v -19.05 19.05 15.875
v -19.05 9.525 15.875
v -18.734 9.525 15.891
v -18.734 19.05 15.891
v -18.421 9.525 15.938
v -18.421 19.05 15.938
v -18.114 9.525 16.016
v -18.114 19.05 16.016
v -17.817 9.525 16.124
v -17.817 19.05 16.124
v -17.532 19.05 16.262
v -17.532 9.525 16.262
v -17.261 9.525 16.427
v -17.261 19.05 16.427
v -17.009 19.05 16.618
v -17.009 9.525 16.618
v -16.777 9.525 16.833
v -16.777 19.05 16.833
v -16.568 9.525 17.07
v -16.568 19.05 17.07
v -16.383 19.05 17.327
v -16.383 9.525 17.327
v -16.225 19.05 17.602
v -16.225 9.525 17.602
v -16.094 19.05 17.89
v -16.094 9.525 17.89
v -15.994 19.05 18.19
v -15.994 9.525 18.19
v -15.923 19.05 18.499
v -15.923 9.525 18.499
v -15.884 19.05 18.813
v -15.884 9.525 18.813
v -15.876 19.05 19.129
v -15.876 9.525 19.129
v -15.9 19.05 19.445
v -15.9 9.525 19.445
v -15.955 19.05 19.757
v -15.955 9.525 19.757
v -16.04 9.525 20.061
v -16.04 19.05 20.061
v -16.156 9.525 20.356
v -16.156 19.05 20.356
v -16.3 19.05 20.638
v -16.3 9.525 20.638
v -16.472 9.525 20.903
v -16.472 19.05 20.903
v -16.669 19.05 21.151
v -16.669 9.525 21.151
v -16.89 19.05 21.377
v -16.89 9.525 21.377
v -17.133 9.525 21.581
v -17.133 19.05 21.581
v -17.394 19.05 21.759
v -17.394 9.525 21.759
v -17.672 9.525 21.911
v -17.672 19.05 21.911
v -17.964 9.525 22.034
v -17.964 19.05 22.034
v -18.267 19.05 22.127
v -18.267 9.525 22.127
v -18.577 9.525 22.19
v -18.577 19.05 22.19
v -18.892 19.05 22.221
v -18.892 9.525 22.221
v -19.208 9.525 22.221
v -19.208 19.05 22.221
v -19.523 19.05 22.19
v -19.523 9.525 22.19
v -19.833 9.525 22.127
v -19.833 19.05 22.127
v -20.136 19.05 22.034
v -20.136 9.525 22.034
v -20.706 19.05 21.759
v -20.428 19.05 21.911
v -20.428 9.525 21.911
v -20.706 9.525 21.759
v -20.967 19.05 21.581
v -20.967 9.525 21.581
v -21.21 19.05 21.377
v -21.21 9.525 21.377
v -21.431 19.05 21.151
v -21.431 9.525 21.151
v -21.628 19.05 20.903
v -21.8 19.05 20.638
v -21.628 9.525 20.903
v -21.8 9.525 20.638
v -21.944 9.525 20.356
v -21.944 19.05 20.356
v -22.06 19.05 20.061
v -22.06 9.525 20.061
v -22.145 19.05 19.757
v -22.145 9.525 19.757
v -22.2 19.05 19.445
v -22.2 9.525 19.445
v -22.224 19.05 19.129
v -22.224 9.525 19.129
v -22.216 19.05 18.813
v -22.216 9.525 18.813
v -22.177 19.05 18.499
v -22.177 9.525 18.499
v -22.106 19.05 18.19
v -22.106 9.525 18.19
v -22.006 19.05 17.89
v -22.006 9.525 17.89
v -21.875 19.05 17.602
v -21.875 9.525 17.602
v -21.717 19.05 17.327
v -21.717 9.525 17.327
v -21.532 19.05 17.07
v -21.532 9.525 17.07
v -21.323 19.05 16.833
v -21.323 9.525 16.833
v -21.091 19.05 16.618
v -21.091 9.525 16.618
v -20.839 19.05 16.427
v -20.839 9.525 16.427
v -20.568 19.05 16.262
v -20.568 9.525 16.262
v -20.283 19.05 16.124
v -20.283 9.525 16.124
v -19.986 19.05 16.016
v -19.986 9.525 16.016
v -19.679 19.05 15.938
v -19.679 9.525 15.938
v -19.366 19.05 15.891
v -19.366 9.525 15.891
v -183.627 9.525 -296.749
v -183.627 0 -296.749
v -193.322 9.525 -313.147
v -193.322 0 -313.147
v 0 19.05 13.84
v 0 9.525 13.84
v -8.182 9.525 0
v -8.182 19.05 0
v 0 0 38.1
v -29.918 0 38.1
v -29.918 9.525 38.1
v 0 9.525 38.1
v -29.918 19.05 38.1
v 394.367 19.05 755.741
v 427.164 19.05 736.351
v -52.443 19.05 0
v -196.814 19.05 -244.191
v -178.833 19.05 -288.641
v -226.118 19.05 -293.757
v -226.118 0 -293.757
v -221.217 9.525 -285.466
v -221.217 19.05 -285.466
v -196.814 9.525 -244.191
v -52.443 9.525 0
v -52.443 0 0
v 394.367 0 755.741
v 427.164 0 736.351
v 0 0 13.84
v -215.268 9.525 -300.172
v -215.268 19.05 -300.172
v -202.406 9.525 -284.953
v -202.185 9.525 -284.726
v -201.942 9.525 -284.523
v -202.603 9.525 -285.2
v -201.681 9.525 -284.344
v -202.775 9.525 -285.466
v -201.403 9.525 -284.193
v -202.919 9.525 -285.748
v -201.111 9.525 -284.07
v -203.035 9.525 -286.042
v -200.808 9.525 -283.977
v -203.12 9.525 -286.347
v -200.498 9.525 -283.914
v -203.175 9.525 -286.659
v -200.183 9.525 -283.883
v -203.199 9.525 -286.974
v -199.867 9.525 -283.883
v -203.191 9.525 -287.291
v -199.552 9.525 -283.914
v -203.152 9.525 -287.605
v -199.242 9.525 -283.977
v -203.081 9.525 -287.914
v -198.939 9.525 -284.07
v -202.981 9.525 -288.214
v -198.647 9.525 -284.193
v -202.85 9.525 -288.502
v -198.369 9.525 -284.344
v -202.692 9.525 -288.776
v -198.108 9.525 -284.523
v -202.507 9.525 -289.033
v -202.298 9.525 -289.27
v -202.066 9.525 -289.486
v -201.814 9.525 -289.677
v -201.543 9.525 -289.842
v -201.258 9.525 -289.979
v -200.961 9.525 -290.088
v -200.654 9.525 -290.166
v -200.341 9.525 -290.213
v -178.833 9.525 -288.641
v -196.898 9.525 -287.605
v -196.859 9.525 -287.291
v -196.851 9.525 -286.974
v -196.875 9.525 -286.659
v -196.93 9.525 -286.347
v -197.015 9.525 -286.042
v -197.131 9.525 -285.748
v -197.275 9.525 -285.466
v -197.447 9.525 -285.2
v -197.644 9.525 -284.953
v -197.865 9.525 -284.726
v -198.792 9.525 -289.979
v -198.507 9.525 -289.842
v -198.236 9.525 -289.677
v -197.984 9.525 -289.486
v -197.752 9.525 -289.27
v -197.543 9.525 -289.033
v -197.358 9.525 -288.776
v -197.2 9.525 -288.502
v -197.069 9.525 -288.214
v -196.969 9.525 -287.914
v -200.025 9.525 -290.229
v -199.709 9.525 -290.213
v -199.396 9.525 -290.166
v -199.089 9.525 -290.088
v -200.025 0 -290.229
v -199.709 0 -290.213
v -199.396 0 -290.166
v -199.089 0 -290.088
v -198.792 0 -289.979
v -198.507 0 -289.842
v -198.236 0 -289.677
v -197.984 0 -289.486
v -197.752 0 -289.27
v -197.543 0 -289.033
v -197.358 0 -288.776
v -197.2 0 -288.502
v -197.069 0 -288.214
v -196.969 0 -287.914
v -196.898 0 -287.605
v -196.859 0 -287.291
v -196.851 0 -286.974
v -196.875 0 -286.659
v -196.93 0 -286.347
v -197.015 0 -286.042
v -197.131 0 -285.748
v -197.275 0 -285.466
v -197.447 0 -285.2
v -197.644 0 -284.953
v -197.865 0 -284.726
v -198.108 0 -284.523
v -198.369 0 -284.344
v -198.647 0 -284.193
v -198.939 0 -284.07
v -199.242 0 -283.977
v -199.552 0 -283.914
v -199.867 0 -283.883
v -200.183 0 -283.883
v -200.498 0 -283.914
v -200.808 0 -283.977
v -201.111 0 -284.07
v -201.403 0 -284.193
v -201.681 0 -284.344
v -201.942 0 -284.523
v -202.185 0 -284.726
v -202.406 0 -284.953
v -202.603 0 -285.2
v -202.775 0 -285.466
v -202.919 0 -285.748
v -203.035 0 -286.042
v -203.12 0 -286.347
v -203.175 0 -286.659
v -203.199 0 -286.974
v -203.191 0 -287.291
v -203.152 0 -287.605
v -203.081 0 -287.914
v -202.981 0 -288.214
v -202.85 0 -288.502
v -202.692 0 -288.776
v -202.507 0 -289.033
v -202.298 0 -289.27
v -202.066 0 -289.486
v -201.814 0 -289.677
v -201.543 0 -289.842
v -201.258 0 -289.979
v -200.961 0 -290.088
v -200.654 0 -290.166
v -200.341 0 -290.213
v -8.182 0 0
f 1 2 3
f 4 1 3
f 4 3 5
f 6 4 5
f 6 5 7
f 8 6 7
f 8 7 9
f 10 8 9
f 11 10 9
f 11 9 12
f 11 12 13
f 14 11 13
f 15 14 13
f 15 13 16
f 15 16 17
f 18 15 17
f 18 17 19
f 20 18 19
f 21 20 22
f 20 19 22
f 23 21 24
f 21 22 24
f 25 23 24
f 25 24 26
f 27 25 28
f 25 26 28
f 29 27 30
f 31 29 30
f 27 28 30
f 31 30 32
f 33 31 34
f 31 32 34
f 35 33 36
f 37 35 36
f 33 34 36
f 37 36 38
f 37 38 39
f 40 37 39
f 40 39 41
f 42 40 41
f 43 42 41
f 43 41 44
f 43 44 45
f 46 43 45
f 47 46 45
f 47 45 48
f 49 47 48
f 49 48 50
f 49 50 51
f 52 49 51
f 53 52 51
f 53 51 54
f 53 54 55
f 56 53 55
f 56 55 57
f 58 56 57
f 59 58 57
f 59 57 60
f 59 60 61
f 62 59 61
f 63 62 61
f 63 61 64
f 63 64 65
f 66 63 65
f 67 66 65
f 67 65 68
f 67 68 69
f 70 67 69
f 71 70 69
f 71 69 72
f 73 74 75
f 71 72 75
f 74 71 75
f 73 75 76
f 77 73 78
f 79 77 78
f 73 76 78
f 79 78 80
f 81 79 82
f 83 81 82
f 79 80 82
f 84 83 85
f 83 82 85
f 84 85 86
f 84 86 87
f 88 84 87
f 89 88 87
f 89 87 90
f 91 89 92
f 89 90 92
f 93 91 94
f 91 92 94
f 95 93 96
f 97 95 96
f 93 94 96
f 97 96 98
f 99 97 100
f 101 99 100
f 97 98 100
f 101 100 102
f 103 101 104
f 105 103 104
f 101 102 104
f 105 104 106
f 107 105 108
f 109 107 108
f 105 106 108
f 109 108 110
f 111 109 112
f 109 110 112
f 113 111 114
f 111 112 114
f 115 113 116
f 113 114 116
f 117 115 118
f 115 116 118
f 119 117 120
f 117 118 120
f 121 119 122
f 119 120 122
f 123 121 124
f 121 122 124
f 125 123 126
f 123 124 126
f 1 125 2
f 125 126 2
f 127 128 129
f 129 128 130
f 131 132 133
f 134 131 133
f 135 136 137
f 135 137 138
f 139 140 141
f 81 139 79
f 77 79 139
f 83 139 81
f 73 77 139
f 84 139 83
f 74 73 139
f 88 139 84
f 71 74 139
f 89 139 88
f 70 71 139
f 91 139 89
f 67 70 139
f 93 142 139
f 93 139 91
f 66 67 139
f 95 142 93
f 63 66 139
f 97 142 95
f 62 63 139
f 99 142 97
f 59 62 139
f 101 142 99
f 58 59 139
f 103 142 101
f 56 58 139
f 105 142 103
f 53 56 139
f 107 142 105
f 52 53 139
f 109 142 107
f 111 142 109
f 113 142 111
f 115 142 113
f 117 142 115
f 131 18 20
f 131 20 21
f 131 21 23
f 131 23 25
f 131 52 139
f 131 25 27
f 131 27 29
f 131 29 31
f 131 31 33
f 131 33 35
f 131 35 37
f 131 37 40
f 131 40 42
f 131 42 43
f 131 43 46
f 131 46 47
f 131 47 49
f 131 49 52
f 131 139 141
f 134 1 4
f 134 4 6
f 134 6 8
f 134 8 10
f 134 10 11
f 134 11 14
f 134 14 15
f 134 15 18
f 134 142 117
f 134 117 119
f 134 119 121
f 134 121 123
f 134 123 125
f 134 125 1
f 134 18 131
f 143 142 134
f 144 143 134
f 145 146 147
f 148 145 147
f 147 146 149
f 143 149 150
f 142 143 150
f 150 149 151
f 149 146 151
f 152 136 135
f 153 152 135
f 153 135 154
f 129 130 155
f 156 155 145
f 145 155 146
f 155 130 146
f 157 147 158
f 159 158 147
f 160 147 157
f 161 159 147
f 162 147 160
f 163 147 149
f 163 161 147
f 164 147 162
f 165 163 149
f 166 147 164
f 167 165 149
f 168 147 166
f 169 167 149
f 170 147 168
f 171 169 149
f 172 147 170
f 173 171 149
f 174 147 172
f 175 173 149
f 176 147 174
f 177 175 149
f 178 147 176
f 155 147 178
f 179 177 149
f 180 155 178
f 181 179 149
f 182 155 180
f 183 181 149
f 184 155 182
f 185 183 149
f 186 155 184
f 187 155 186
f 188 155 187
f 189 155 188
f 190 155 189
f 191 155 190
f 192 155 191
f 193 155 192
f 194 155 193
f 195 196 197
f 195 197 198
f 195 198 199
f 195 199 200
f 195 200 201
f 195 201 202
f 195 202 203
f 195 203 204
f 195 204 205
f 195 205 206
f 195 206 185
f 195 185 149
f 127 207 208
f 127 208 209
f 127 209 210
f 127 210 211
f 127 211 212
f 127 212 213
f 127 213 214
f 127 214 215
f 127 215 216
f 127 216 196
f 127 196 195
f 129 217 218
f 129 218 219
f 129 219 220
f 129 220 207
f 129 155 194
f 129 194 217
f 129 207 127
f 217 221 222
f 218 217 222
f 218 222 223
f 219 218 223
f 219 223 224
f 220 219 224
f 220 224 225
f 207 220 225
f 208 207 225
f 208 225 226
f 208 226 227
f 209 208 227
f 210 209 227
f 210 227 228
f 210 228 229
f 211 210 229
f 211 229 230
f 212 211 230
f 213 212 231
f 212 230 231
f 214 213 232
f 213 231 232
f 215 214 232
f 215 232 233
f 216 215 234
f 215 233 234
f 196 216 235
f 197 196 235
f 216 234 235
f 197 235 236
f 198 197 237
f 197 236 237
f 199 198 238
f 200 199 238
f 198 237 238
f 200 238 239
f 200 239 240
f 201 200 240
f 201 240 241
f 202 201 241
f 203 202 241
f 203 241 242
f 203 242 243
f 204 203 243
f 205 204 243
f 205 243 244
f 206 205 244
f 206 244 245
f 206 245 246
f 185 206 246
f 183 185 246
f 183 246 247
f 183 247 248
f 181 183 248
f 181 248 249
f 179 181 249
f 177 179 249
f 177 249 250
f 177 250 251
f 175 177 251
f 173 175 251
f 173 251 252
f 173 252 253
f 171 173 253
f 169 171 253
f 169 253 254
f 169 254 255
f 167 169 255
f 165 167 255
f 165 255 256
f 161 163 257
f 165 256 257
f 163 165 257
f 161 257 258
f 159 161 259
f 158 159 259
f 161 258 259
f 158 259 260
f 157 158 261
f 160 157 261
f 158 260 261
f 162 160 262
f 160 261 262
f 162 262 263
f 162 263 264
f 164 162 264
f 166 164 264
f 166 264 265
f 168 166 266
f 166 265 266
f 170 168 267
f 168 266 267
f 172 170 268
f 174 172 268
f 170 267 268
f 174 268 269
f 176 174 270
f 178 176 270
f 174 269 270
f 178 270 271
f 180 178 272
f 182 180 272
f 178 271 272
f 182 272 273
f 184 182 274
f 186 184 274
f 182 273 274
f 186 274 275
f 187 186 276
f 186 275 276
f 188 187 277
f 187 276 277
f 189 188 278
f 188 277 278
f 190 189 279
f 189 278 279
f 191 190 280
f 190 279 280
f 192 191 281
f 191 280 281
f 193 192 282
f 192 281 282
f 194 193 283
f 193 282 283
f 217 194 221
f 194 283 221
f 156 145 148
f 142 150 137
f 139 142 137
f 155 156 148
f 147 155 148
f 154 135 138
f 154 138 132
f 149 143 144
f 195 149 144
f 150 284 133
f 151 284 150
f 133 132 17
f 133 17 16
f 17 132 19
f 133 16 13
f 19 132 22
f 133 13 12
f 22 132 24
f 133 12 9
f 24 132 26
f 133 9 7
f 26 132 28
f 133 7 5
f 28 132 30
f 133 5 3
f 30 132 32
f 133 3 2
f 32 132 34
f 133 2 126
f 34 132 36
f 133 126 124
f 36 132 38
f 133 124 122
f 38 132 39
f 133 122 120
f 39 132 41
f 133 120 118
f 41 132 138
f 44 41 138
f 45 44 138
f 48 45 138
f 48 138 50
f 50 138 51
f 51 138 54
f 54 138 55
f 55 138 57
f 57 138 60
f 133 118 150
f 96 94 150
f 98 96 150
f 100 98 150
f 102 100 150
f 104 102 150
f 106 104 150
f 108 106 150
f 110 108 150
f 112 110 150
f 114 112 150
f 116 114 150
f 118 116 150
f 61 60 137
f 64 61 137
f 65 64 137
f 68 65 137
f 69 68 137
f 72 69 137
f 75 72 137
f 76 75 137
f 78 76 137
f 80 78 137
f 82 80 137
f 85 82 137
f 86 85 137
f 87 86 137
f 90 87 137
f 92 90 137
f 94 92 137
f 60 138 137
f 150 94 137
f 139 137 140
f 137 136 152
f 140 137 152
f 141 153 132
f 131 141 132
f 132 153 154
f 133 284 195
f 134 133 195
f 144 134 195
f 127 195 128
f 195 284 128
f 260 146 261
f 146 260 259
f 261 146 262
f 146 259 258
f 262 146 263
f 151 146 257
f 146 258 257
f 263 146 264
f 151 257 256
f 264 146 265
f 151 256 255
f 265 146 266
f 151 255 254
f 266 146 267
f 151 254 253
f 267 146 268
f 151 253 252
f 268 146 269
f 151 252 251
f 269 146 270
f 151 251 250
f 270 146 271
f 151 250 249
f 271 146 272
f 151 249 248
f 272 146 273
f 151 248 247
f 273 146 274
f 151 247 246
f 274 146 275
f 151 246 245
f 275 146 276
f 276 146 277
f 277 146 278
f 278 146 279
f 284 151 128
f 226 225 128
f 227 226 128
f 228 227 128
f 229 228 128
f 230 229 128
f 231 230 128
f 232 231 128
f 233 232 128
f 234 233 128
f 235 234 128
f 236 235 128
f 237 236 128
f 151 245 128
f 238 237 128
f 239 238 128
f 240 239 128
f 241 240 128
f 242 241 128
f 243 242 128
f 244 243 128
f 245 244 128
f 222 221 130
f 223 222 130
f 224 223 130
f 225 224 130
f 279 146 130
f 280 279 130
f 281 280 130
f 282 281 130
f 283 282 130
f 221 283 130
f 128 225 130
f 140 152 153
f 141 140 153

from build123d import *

# Parameters (mm, degrees)
BOSS_EXTRUDE4_DEPTH = 19.05
CUT_EXTRUDE5_DEPTH  = 9.525
CUT_EXTRUDE6_DEPTH  = 9.525
SKETCH10_R          = 3.175
CUT_EXTRUDE7_DEPTH  = 19.05


with BuildPart() as part:
    # Sketch2 → Boss-Extrude4 (new body)
    with BuildSketch(Plane(origin=(0, 0, 0), x_dir=(1, 0, 0), z_dir=(0, 1, 0))):
        Polygon((-183.626593256, 296.748681841), (-193.321682542, 313.147088585), (-226.11849603, 293.756910013), (-52.443119188, 0), (-29.917583168, -38.1), (394.367218256, -755.741121604), (427.164031744, -736.350943032), (0, -13.839851848), (-8.182416832, 0), align=None)
    extrude(amount=BOSS_EXTRUDE4_DEPTH)

    # Sketch8 → Cut-Extrude5 (cut)
    with BuildSketch(Plane(origin=(0, 19.05, 0), x_dir=(1, 0, 0), z_dir=(0, 1, 0))):
        Polygon((-193.321682542, 313.147088585), (-215.267964049, 300.171976915), (-221.216787177, 285.466092555), (-196.814123155, 244.191092555), (-178.833212823, 288.641092555), align=None)
    extrude(amount=-CUT_EXTRUDE5_DEPTH, mode=Mode.SUBTRACT)

    # Sketch9 → Cut-Extrude6 (cut)
    with BuildSketch(Plane.XZ):
        Polygon((-52.443119188, 0), (-29.917583168, 38.1), (0, 38.1), (0, 13.839851848), (-8.182416832, 0), align=None)
    extrude(amount=-CUT_EXTRUDE6_DEPTH, mode=Mode.SUBTRACT)

    # Sketch10 → Cut-Extrude7 (cut)
    with BuildSketch(Plane.XZ):
        with Locations(Location((-200.025, -287.053592555, 0), (0, 0, 270))):
            Circle(SKETCH10_R)
        with Locations(Location((-19.05, 19.05, 0), (0, 0, 270))):
            Circle(SKETCH10_R)
    extrude(amount=-CUT_EXTRUDE7_DEPTH, mode=Mode.SUBTRACT)


solid = part.part
